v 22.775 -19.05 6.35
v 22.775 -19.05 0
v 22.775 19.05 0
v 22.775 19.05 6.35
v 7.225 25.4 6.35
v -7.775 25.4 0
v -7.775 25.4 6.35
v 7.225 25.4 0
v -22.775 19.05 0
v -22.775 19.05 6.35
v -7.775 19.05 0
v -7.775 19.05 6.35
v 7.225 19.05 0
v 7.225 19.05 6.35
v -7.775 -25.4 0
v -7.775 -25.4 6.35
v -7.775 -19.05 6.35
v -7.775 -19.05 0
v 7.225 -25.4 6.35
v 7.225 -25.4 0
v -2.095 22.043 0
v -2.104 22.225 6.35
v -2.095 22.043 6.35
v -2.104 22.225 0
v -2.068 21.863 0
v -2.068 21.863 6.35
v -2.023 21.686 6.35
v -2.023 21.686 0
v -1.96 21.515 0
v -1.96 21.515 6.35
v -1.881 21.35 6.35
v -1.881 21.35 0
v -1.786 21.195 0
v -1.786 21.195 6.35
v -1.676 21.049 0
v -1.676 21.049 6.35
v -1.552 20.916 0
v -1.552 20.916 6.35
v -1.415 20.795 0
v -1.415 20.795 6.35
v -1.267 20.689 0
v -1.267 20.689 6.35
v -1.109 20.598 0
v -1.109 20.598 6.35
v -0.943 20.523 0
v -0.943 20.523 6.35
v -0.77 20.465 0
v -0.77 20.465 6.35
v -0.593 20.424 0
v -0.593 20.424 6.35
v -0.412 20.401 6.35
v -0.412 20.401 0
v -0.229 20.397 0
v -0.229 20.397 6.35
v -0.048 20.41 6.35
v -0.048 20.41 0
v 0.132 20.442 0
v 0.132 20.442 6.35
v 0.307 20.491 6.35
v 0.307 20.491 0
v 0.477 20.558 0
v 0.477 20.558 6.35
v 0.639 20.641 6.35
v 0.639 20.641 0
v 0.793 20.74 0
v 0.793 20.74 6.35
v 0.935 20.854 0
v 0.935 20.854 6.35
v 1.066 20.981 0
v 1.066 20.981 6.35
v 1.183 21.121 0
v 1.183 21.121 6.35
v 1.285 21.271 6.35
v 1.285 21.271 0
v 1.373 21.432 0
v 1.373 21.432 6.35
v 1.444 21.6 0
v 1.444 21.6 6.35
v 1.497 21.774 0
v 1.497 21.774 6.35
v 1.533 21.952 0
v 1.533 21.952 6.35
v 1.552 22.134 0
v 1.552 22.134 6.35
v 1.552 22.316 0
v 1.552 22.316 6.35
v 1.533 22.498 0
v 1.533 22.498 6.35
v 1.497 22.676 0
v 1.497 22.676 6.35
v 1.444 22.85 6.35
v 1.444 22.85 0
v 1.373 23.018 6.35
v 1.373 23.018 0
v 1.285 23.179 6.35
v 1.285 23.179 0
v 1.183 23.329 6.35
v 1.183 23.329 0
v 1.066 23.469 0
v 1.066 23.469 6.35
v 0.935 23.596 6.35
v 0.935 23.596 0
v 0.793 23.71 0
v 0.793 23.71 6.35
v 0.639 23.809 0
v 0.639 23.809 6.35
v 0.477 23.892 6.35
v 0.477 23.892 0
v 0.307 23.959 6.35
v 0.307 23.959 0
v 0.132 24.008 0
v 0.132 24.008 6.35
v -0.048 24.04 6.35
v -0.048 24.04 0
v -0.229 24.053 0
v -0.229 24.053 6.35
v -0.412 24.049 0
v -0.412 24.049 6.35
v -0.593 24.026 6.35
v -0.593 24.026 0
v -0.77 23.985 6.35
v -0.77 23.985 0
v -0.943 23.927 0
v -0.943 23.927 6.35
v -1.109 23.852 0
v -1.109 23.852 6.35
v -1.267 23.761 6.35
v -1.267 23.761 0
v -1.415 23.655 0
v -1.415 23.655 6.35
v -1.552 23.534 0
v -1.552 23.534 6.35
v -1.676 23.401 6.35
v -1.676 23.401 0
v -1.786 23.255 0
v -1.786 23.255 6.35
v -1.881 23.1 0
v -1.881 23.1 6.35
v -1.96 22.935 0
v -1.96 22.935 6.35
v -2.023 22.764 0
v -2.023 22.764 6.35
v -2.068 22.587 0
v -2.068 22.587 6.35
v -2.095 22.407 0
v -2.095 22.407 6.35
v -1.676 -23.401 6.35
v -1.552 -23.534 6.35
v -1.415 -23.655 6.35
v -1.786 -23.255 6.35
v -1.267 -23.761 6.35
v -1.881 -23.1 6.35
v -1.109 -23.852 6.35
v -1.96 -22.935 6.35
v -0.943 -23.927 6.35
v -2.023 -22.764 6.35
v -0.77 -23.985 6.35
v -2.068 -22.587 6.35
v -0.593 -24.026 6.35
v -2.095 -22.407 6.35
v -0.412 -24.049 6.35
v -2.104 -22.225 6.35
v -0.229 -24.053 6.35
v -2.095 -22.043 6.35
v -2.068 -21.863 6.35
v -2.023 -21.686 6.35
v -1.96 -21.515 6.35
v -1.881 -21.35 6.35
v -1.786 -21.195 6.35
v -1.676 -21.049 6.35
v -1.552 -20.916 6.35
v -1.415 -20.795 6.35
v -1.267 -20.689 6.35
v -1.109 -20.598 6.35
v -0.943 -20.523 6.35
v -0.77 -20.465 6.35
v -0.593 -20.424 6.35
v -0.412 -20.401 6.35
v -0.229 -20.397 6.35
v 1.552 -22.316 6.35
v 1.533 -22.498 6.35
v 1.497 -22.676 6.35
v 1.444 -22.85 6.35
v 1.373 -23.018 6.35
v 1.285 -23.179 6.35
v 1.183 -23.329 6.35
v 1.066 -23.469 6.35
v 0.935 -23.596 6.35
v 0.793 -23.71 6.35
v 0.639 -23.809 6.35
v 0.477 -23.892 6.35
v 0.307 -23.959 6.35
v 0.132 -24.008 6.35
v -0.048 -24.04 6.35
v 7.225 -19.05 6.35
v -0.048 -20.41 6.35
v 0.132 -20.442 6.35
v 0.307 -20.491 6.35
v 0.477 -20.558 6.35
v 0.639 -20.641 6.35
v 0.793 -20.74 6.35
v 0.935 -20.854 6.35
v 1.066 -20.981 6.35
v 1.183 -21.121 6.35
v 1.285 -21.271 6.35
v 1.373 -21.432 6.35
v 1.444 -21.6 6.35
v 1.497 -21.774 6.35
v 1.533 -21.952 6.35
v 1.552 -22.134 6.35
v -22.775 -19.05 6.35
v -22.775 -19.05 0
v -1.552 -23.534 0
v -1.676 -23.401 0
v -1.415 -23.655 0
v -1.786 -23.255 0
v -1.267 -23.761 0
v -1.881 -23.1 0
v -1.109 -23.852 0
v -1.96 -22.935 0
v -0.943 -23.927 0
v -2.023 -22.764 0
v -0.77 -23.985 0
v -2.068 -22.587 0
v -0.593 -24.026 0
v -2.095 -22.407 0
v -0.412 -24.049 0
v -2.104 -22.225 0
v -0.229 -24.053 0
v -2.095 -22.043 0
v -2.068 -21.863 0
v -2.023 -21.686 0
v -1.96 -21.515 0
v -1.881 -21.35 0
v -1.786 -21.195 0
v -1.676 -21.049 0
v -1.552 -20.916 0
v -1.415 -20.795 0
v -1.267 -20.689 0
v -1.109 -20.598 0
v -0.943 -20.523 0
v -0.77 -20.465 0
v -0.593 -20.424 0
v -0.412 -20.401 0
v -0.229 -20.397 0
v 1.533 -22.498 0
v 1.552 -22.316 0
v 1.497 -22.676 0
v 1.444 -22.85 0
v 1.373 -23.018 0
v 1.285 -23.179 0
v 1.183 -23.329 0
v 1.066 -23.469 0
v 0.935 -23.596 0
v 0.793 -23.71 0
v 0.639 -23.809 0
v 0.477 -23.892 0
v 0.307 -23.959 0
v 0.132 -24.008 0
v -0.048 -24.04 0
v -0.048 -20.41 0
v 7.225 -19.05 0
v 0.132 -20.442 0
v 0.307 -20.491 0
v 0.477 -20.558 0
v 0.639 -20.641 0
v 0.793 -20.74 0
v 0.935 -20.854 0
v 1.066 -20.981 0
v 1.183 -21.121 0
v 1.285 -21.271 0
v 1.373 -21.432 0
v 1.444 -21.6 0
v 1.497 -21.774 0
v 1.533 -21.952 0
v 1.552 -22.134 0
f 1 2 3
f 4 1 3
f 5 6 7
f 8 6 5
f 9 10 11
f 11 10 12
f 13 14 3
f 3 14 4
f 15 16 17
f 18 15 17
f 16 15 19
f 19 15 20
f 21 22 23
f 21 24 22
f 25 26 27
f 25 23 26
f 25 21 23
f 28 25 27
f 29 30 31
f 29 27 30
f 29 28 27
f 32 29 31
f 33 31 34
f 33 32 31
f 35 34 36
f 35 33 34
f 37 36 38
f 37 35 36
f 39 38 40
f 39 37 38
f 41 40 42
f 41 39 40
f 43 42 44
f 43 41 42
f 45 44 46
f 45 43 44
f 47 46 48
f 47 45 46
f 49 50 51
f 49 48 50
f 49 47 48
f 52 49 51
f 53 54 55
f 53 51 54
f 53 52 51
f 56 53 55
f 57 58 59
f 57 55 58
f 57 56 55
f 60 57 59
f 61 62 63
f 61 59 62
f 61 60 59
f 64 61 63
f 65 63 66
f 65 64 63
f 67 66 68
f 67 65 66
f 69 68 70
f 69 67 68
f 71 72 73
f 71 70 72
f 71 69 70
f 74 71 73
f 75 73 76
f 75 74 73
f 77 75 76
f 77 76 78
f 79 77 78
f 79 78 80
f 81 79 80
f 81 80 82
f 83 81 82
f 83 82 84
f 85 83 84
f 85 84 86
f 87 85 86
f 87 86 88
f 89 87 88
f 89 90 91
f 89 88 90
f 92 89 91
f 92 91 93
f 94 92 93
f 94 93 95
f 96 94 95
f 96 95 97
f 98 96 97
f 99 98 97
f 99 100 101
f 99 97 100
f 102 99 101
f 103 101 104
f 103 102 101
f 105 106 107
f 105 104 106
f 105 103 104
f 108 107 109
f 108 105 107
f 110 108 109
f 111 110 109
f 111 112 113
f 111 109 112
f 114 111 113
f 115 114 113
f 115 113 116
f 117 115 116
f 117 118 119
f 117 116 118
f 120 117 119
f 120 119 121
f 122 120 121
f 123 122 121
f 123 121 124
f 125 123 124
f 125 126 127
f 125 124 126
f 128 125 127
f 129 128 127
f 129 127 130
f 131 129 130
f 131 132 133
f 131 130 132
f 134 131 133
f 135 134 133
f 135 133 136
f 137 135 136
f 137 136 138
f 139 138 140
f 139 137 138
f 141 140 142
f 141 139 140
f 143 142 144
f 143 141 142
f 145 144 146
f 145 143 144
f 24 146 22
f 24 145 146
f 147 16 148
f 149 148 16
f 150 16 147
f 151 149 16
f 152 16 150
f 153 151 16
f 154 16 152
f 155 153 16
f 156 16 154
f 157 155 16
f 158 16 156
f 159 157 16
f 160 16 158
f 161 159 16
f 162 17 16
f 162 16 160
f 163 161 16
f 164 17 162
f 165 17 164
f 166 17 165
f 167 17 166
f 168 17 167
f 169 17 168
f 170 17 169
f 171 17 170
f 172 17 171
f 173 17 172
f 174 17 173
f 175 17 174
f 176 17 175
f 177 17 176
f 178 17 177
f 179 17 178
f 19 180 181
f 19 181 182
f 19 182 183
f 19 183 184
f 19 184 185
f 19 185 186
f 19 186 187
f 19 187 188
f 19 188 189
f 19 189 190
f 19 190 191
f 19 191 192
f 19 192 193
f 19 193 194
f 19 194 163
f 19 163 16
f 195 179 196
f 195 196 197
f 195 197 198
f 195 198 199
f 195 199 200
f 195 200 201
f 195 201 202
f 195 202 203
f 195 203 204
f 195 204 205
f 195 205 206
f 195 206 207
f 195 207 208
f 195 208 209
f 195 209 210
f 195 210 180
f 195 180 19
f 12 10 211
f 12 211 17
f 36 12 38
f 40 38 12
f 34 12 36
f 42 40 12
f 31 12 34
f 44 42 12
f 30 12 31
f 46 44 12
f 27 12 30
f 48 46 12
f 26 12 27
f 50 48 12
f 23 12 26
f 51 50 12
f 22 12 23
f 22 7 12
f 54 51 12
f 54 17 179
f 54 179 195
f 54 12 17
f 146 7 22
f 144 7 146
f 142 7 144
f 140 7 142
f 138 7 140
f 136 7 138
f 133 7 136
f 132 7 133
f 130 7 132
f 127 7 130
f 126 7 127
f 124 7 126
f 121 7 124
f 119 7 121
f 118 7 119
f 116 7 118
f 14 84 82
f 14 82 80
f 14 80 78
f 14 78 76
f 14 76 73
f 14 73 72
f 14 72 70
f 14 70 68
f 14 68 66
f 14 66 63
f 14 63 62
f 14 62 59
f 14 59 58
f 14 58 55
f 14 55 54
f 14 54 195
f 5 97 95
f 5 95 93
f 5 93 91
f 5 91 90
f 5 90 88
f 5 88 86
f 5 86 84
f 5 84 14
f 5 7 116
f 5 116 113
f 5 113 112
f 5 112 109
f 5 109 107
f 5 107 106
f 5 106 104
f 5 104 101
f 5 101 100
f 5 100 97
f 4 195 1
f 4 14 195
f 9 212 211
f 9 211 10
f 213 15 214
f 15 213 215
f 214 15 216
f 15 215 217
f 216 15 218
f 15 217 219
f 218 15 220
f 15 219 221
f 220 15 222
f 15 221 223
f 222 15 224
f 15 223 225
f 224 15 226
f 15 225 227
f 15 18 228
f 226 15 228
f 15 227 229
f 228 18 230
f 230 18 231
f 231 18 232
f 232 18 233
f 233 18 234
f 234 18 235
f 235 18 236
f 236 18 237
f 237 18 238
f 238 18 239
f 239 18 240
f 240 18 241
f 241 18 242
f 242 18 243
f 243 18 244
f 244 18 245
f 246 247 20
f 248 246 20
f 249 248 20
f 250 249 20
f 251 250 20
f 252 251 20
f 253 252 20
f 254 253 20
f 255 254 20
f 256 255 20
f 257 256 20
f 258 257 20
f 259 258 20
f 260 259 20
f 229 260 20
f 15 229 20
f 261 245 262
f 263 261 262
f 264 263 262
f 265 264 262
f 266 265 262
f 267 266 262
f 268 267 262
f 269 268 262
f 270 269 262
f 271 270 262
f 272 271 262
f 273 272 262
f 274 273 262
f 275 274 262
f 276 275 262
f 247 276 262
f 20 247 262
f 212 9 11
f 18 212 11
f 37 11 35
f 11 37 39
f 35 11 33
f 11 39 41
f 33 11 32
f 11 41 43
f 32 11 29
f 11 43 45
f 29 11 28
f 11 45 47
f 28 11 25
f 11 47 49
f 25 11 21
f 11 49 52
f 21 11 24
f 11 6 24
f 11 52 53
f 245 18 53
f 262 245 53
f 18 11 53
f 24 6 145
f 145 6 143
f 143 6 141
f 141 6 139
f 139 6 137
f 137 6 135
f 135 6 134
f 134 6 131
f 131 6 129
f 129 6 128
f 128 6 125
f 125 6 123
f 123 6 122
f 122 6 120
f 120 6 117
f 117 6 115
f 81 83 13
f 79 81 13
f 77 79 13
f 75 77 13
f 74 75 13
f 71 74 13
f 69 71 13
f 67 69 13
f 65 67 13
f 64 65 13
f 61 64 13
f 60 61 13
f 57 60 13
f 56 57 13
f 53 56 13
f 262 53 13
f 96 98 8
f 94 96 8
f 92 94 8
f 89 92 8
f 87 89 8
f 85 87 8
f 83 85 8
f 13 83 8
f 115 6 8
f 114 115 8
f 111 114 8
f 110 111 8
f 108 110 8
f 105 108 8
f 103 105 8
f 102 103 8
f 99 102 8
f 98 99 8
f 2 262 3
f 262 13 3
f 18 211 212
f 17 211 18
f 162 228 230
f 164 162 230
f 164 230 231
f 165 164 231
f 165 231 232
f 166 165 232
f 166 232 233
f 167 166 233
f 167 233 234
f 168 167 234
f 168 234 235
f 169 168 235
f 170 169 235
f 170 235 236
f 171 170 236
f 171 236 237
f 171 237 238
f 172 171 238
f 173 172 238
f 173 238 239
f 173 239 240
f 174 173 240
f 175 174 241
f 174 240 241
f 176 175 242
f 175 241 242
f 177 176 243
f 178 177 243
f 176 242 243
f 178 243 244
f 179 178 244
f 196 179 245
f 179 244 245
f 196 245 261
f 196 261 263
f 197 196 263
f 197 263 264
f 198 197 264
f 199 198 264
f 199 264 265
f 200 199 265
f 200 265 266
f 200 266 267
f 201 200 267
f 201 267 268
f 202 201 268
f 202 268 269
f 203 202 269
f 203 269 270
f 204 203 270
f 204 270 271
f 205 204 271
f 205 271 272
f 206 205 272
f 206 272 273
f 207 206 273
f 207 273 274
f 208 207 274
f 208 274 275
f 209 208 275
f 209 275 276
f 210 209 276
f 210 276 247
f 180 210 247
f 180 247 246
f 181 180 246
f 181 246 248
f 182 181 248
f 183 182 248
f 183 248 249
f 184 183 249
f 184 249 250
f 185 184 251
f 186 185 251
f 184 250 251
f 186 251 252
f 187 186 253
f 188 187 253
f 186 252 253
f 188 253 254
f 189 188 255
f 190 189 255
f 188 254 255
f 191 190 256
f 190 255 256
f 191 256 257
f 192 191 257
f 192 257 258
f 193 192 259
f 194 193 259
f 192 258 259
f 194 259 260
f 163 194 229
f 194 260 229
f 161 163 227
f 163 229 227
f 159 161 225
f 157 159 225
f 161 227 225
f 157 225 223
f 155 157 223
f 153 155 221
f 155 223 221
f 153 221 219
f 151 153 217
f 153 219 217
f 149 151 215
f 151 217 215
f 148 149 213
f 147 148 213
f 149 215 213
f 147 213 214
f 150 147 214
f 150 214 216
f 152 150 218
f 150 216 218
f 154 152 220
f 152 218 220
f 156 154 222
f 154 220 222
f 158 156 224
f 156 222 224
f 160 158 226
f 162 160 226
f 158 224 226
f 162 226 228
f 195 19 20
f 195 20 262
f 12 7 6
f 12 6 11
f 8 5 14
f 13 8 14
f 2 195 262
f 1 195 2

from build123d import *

# Parameters (mm, degrees)
SKETCH1_W             = 45.55
SKETCH1_H             = 50.8
BOSS_EXTRUDE1_DEPTH   = 6.35
SKETCH2_W             = 15
SKETCH2_H             = 6.35
SKETCH2_W_2           = 15.55
CUT_EXTRUDE1_DEPTH    = 6.35
F_6_CLEARANCE_HOLE1_D = 3.6576


with BuildPart() as part:
    # Sketch1 → Boss-Extrude1 (new body)
    with BuildSketch(Plane.XY):
        Rectangle(SKETCH1_W, SKETCH1_H)
    extrude(amount=BOSS_EXTRUDE1_DEPTH)

    # Sketch2 → Cut-Extrude1 (cut)
    with BuildSketch(Plane.XY.offset(6.35)):
        with Locations((-15.275, -22.225)):
            Rectangle(SKETCH2_W, SKETCH2_H)
        with Locations((15, -22.225)):
            Rectangle(SKETCH2_W_2, SKETCH2_H)
    cut_extrude1 = extrude(amount=-CUT_EXTRUDE1_DEPTH, mode=Mode.SUBTRACT)

    # #6 Clearance Hole1 (through all)
    with Locations(Plane.XY.offset(6.35)):
        with Locations((-0.275, -22.225)):
            f_6_clearance_hole1 = Hole(F_6_CLEARANCE_HOLE1_D / 2)

    # Mirror1: Cut-Extrude1, #6 Clearance Hole1 across plane
    add(cut_extrude1.mirror(Plane.ZX), mode=Mode.SUBTRACT)
    add(f_6_clearance_hole1.mirror(Plane.ZX), mode=Mode.SUBTRACT)


solid = part.part
